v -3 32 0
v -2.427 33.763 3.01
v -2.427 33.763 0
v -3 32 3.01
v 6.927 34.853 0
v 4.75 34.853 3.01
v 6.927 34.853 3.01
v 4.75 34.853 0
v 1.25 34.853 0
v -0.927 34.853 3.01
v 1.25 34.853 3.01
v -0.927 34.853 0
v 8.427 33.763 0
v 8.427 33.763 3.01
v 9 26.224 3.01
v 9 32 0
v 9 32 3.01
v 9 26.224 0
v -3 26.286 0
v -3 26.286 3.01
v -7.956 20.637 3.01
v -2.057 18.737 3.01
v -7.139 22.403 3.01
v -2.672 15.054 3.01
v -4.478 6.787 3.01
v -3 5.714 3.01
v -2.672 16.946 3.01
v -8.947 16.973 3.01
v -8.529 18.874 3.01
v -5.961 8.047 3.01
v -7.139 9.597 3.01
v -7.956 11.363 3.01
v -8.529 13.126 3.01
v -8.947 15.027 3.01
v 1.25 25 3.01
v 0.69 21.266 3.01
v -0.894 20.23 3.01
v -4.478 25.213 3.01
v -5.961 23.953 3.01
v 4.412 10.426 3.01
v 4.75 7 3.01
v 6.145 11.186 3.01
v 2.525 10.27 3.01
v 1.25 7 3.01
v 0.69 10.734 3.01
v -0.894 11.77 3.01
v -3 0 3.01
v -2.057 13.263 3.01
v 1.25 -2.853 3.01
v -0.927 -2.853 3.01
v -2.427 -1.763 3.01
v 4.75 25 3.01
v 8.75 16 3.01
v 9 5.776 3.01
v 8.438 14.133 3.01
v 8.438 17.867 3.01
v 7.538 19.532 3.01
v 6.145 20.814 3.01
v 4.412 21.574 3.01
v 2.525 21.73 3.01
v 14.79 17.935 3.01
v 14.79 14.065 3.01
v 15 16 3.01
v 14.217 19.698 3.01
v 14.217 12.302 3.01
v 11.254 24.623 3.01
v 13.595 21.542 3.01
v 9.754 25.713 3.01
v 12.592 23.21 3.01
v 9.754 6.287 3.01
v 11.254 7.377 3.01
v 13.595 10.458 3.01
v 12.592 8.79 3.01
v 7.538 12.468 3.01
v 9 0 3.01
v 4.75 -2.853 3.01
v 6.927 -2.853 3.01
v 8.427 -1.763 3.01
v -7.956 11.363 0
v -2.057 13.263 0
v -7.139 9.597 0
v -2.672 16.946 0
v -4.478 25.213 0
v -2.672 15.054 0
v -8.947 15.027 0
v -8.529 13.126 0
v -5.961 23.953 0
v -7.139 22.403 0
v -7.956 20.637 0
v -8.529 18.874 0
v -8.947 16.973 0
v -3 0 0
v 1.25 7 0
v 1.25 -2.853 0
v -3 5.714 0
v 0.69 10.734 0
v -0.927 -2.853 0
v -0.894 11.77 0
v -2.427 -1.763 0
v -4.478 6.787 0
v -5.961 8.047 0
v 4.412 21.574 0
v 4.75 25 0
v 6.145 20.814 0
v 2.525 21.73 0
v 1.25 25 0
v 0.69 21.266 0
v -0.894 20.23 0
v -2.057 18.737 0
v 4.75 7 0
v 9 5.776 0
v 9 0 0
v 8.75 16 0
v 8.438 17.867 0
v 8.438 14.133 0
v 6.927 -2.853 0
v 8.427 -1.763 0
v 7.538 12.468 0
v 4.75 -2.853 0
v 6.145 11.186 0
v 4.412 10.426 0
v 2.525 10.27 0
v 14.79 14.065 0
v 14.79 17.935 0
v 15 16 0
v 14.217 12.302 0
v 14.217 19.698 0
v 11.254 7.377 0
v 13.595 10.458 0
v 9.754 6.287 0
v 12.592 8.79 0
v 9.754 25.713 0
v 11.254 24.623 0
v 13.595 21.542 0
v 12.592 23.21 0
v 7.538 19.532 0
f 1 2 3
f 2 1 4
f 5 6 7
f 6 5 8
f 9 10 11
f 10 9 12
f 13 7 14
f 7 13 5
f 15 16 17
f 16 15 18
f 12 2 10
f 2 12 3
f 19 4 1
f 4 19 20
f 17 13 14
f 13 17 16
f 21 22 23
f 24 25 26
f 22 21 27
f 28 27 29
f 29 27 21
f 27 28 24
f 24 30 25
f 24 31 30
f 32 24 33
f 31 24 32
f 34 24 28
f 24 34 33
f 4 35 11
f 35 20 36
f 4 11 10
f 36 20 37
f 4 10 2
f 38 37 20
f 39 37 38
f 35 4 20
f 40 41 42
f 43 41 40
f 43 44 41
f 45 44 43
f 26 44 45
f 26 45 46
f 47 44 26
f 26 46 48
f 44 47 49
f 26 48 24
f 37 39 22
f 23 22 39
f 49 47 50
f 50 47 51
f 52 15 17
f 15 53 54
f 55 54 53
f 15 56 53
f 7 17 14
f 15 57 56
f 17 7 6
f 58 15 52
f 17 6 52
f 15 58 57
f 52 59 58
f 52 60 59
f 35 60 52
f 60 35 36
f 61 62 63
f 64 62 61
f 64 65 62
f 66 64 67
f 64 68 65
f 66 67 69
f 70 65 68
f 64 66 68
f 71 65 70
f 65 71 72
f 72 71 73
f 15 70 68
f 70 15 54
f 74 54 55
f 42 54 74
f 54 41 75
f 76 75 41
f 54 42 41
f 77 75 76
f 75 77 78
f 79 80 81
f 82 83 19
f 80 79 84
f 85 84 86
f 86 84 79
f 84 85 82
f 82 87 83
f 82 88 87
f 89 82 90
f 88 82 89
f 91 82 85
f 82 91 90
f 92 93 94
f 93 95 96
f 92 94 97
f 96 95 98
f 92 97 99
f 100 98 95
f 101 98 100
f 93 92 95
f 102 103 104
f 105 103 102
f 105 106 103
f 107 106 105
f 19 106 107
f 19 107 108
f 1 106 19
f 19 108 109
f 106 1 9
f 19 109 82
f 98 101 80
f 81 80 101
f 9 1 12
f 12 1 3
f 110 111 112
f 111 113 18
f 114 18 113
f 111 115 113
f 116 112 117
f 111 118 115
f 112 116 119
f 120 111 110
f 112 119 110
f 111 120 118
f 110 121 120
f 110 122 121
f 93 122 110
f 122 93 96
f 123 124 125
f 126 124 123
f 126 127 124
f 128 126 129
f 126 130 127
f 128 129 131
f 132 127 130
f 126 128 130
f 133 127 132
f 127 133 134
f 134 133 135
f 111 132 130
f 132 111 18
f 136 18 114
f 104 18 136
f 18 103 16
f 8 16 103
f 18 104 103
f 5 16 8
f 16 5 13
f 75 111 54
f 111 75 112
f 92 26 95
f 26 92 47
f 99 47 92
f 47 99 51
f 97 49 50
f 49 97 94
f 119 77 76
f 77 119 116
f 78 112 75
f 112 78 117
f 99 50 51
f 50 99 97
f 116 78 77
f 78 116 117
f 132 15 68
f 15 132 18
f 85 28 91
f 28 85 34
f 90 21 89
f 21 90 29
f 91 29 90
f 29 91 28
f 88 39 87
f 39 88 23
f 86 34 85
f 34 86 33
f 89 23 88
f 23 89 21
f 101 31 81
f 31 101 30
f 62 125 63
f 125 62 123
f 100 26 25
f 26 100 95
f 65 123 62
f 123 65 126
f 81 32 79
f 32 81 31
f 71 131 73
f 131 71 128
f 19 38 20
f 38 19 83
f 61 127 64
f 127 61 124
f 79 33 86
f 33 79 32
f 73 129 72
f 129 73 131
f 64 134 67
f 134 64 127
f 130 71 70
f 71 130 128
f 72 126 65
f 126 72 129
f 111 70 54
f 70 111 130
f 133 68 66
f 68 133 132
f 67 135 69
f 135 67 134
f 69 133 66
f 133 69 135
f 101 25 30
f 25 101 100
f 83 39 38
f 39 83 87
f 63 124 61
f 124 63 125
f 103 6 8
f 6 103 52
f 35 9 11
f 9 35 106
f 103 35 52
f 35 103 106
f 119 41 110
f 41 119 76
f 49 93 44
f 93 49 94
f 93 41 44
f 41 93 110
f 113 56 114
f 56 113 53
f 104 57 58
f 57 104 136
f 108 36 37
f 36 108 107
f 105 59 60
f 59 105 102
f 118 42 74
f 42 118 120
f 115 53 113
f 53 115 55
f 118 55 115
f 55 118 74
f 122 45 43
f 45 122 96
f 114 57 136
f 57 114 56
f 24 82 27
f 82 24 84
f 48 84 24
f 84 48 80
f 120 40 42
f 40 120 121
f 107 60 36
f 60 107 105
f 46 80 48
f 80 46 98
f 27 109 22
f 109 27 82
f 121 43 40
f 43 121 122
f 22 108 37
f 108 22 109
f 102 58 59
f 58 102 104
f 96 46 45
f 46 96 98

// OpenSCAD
// f. beachler
// longevity software d.b.a. terawatt industries

zleads_bushing_retainer();

module zleads_bushing_retainer() {
	difference() {
		minkowski() {
			union() {
				cube([9 - 3, 35 - 3, 3]);
				translate([6 / 2, 32 / 2, 0]) cylinder(r = 9, h = 3);
			}
			cylinder(r = 3, h = 0.01);
		}
		// slots
		translate([(6 - 3.5) / 2, 25, -0.1]) cube([3 + 0.5, 10, 5 + 1]);
		translate([(6 - 3.5) / 2, -3, -0.1]) cube([3 + 0.5, 10, 5 + 1]);
		translate([6 / 2, 32 / 2, -0.1]) cylinder(r = 5.75, h = 5 + 1);
	}
}
